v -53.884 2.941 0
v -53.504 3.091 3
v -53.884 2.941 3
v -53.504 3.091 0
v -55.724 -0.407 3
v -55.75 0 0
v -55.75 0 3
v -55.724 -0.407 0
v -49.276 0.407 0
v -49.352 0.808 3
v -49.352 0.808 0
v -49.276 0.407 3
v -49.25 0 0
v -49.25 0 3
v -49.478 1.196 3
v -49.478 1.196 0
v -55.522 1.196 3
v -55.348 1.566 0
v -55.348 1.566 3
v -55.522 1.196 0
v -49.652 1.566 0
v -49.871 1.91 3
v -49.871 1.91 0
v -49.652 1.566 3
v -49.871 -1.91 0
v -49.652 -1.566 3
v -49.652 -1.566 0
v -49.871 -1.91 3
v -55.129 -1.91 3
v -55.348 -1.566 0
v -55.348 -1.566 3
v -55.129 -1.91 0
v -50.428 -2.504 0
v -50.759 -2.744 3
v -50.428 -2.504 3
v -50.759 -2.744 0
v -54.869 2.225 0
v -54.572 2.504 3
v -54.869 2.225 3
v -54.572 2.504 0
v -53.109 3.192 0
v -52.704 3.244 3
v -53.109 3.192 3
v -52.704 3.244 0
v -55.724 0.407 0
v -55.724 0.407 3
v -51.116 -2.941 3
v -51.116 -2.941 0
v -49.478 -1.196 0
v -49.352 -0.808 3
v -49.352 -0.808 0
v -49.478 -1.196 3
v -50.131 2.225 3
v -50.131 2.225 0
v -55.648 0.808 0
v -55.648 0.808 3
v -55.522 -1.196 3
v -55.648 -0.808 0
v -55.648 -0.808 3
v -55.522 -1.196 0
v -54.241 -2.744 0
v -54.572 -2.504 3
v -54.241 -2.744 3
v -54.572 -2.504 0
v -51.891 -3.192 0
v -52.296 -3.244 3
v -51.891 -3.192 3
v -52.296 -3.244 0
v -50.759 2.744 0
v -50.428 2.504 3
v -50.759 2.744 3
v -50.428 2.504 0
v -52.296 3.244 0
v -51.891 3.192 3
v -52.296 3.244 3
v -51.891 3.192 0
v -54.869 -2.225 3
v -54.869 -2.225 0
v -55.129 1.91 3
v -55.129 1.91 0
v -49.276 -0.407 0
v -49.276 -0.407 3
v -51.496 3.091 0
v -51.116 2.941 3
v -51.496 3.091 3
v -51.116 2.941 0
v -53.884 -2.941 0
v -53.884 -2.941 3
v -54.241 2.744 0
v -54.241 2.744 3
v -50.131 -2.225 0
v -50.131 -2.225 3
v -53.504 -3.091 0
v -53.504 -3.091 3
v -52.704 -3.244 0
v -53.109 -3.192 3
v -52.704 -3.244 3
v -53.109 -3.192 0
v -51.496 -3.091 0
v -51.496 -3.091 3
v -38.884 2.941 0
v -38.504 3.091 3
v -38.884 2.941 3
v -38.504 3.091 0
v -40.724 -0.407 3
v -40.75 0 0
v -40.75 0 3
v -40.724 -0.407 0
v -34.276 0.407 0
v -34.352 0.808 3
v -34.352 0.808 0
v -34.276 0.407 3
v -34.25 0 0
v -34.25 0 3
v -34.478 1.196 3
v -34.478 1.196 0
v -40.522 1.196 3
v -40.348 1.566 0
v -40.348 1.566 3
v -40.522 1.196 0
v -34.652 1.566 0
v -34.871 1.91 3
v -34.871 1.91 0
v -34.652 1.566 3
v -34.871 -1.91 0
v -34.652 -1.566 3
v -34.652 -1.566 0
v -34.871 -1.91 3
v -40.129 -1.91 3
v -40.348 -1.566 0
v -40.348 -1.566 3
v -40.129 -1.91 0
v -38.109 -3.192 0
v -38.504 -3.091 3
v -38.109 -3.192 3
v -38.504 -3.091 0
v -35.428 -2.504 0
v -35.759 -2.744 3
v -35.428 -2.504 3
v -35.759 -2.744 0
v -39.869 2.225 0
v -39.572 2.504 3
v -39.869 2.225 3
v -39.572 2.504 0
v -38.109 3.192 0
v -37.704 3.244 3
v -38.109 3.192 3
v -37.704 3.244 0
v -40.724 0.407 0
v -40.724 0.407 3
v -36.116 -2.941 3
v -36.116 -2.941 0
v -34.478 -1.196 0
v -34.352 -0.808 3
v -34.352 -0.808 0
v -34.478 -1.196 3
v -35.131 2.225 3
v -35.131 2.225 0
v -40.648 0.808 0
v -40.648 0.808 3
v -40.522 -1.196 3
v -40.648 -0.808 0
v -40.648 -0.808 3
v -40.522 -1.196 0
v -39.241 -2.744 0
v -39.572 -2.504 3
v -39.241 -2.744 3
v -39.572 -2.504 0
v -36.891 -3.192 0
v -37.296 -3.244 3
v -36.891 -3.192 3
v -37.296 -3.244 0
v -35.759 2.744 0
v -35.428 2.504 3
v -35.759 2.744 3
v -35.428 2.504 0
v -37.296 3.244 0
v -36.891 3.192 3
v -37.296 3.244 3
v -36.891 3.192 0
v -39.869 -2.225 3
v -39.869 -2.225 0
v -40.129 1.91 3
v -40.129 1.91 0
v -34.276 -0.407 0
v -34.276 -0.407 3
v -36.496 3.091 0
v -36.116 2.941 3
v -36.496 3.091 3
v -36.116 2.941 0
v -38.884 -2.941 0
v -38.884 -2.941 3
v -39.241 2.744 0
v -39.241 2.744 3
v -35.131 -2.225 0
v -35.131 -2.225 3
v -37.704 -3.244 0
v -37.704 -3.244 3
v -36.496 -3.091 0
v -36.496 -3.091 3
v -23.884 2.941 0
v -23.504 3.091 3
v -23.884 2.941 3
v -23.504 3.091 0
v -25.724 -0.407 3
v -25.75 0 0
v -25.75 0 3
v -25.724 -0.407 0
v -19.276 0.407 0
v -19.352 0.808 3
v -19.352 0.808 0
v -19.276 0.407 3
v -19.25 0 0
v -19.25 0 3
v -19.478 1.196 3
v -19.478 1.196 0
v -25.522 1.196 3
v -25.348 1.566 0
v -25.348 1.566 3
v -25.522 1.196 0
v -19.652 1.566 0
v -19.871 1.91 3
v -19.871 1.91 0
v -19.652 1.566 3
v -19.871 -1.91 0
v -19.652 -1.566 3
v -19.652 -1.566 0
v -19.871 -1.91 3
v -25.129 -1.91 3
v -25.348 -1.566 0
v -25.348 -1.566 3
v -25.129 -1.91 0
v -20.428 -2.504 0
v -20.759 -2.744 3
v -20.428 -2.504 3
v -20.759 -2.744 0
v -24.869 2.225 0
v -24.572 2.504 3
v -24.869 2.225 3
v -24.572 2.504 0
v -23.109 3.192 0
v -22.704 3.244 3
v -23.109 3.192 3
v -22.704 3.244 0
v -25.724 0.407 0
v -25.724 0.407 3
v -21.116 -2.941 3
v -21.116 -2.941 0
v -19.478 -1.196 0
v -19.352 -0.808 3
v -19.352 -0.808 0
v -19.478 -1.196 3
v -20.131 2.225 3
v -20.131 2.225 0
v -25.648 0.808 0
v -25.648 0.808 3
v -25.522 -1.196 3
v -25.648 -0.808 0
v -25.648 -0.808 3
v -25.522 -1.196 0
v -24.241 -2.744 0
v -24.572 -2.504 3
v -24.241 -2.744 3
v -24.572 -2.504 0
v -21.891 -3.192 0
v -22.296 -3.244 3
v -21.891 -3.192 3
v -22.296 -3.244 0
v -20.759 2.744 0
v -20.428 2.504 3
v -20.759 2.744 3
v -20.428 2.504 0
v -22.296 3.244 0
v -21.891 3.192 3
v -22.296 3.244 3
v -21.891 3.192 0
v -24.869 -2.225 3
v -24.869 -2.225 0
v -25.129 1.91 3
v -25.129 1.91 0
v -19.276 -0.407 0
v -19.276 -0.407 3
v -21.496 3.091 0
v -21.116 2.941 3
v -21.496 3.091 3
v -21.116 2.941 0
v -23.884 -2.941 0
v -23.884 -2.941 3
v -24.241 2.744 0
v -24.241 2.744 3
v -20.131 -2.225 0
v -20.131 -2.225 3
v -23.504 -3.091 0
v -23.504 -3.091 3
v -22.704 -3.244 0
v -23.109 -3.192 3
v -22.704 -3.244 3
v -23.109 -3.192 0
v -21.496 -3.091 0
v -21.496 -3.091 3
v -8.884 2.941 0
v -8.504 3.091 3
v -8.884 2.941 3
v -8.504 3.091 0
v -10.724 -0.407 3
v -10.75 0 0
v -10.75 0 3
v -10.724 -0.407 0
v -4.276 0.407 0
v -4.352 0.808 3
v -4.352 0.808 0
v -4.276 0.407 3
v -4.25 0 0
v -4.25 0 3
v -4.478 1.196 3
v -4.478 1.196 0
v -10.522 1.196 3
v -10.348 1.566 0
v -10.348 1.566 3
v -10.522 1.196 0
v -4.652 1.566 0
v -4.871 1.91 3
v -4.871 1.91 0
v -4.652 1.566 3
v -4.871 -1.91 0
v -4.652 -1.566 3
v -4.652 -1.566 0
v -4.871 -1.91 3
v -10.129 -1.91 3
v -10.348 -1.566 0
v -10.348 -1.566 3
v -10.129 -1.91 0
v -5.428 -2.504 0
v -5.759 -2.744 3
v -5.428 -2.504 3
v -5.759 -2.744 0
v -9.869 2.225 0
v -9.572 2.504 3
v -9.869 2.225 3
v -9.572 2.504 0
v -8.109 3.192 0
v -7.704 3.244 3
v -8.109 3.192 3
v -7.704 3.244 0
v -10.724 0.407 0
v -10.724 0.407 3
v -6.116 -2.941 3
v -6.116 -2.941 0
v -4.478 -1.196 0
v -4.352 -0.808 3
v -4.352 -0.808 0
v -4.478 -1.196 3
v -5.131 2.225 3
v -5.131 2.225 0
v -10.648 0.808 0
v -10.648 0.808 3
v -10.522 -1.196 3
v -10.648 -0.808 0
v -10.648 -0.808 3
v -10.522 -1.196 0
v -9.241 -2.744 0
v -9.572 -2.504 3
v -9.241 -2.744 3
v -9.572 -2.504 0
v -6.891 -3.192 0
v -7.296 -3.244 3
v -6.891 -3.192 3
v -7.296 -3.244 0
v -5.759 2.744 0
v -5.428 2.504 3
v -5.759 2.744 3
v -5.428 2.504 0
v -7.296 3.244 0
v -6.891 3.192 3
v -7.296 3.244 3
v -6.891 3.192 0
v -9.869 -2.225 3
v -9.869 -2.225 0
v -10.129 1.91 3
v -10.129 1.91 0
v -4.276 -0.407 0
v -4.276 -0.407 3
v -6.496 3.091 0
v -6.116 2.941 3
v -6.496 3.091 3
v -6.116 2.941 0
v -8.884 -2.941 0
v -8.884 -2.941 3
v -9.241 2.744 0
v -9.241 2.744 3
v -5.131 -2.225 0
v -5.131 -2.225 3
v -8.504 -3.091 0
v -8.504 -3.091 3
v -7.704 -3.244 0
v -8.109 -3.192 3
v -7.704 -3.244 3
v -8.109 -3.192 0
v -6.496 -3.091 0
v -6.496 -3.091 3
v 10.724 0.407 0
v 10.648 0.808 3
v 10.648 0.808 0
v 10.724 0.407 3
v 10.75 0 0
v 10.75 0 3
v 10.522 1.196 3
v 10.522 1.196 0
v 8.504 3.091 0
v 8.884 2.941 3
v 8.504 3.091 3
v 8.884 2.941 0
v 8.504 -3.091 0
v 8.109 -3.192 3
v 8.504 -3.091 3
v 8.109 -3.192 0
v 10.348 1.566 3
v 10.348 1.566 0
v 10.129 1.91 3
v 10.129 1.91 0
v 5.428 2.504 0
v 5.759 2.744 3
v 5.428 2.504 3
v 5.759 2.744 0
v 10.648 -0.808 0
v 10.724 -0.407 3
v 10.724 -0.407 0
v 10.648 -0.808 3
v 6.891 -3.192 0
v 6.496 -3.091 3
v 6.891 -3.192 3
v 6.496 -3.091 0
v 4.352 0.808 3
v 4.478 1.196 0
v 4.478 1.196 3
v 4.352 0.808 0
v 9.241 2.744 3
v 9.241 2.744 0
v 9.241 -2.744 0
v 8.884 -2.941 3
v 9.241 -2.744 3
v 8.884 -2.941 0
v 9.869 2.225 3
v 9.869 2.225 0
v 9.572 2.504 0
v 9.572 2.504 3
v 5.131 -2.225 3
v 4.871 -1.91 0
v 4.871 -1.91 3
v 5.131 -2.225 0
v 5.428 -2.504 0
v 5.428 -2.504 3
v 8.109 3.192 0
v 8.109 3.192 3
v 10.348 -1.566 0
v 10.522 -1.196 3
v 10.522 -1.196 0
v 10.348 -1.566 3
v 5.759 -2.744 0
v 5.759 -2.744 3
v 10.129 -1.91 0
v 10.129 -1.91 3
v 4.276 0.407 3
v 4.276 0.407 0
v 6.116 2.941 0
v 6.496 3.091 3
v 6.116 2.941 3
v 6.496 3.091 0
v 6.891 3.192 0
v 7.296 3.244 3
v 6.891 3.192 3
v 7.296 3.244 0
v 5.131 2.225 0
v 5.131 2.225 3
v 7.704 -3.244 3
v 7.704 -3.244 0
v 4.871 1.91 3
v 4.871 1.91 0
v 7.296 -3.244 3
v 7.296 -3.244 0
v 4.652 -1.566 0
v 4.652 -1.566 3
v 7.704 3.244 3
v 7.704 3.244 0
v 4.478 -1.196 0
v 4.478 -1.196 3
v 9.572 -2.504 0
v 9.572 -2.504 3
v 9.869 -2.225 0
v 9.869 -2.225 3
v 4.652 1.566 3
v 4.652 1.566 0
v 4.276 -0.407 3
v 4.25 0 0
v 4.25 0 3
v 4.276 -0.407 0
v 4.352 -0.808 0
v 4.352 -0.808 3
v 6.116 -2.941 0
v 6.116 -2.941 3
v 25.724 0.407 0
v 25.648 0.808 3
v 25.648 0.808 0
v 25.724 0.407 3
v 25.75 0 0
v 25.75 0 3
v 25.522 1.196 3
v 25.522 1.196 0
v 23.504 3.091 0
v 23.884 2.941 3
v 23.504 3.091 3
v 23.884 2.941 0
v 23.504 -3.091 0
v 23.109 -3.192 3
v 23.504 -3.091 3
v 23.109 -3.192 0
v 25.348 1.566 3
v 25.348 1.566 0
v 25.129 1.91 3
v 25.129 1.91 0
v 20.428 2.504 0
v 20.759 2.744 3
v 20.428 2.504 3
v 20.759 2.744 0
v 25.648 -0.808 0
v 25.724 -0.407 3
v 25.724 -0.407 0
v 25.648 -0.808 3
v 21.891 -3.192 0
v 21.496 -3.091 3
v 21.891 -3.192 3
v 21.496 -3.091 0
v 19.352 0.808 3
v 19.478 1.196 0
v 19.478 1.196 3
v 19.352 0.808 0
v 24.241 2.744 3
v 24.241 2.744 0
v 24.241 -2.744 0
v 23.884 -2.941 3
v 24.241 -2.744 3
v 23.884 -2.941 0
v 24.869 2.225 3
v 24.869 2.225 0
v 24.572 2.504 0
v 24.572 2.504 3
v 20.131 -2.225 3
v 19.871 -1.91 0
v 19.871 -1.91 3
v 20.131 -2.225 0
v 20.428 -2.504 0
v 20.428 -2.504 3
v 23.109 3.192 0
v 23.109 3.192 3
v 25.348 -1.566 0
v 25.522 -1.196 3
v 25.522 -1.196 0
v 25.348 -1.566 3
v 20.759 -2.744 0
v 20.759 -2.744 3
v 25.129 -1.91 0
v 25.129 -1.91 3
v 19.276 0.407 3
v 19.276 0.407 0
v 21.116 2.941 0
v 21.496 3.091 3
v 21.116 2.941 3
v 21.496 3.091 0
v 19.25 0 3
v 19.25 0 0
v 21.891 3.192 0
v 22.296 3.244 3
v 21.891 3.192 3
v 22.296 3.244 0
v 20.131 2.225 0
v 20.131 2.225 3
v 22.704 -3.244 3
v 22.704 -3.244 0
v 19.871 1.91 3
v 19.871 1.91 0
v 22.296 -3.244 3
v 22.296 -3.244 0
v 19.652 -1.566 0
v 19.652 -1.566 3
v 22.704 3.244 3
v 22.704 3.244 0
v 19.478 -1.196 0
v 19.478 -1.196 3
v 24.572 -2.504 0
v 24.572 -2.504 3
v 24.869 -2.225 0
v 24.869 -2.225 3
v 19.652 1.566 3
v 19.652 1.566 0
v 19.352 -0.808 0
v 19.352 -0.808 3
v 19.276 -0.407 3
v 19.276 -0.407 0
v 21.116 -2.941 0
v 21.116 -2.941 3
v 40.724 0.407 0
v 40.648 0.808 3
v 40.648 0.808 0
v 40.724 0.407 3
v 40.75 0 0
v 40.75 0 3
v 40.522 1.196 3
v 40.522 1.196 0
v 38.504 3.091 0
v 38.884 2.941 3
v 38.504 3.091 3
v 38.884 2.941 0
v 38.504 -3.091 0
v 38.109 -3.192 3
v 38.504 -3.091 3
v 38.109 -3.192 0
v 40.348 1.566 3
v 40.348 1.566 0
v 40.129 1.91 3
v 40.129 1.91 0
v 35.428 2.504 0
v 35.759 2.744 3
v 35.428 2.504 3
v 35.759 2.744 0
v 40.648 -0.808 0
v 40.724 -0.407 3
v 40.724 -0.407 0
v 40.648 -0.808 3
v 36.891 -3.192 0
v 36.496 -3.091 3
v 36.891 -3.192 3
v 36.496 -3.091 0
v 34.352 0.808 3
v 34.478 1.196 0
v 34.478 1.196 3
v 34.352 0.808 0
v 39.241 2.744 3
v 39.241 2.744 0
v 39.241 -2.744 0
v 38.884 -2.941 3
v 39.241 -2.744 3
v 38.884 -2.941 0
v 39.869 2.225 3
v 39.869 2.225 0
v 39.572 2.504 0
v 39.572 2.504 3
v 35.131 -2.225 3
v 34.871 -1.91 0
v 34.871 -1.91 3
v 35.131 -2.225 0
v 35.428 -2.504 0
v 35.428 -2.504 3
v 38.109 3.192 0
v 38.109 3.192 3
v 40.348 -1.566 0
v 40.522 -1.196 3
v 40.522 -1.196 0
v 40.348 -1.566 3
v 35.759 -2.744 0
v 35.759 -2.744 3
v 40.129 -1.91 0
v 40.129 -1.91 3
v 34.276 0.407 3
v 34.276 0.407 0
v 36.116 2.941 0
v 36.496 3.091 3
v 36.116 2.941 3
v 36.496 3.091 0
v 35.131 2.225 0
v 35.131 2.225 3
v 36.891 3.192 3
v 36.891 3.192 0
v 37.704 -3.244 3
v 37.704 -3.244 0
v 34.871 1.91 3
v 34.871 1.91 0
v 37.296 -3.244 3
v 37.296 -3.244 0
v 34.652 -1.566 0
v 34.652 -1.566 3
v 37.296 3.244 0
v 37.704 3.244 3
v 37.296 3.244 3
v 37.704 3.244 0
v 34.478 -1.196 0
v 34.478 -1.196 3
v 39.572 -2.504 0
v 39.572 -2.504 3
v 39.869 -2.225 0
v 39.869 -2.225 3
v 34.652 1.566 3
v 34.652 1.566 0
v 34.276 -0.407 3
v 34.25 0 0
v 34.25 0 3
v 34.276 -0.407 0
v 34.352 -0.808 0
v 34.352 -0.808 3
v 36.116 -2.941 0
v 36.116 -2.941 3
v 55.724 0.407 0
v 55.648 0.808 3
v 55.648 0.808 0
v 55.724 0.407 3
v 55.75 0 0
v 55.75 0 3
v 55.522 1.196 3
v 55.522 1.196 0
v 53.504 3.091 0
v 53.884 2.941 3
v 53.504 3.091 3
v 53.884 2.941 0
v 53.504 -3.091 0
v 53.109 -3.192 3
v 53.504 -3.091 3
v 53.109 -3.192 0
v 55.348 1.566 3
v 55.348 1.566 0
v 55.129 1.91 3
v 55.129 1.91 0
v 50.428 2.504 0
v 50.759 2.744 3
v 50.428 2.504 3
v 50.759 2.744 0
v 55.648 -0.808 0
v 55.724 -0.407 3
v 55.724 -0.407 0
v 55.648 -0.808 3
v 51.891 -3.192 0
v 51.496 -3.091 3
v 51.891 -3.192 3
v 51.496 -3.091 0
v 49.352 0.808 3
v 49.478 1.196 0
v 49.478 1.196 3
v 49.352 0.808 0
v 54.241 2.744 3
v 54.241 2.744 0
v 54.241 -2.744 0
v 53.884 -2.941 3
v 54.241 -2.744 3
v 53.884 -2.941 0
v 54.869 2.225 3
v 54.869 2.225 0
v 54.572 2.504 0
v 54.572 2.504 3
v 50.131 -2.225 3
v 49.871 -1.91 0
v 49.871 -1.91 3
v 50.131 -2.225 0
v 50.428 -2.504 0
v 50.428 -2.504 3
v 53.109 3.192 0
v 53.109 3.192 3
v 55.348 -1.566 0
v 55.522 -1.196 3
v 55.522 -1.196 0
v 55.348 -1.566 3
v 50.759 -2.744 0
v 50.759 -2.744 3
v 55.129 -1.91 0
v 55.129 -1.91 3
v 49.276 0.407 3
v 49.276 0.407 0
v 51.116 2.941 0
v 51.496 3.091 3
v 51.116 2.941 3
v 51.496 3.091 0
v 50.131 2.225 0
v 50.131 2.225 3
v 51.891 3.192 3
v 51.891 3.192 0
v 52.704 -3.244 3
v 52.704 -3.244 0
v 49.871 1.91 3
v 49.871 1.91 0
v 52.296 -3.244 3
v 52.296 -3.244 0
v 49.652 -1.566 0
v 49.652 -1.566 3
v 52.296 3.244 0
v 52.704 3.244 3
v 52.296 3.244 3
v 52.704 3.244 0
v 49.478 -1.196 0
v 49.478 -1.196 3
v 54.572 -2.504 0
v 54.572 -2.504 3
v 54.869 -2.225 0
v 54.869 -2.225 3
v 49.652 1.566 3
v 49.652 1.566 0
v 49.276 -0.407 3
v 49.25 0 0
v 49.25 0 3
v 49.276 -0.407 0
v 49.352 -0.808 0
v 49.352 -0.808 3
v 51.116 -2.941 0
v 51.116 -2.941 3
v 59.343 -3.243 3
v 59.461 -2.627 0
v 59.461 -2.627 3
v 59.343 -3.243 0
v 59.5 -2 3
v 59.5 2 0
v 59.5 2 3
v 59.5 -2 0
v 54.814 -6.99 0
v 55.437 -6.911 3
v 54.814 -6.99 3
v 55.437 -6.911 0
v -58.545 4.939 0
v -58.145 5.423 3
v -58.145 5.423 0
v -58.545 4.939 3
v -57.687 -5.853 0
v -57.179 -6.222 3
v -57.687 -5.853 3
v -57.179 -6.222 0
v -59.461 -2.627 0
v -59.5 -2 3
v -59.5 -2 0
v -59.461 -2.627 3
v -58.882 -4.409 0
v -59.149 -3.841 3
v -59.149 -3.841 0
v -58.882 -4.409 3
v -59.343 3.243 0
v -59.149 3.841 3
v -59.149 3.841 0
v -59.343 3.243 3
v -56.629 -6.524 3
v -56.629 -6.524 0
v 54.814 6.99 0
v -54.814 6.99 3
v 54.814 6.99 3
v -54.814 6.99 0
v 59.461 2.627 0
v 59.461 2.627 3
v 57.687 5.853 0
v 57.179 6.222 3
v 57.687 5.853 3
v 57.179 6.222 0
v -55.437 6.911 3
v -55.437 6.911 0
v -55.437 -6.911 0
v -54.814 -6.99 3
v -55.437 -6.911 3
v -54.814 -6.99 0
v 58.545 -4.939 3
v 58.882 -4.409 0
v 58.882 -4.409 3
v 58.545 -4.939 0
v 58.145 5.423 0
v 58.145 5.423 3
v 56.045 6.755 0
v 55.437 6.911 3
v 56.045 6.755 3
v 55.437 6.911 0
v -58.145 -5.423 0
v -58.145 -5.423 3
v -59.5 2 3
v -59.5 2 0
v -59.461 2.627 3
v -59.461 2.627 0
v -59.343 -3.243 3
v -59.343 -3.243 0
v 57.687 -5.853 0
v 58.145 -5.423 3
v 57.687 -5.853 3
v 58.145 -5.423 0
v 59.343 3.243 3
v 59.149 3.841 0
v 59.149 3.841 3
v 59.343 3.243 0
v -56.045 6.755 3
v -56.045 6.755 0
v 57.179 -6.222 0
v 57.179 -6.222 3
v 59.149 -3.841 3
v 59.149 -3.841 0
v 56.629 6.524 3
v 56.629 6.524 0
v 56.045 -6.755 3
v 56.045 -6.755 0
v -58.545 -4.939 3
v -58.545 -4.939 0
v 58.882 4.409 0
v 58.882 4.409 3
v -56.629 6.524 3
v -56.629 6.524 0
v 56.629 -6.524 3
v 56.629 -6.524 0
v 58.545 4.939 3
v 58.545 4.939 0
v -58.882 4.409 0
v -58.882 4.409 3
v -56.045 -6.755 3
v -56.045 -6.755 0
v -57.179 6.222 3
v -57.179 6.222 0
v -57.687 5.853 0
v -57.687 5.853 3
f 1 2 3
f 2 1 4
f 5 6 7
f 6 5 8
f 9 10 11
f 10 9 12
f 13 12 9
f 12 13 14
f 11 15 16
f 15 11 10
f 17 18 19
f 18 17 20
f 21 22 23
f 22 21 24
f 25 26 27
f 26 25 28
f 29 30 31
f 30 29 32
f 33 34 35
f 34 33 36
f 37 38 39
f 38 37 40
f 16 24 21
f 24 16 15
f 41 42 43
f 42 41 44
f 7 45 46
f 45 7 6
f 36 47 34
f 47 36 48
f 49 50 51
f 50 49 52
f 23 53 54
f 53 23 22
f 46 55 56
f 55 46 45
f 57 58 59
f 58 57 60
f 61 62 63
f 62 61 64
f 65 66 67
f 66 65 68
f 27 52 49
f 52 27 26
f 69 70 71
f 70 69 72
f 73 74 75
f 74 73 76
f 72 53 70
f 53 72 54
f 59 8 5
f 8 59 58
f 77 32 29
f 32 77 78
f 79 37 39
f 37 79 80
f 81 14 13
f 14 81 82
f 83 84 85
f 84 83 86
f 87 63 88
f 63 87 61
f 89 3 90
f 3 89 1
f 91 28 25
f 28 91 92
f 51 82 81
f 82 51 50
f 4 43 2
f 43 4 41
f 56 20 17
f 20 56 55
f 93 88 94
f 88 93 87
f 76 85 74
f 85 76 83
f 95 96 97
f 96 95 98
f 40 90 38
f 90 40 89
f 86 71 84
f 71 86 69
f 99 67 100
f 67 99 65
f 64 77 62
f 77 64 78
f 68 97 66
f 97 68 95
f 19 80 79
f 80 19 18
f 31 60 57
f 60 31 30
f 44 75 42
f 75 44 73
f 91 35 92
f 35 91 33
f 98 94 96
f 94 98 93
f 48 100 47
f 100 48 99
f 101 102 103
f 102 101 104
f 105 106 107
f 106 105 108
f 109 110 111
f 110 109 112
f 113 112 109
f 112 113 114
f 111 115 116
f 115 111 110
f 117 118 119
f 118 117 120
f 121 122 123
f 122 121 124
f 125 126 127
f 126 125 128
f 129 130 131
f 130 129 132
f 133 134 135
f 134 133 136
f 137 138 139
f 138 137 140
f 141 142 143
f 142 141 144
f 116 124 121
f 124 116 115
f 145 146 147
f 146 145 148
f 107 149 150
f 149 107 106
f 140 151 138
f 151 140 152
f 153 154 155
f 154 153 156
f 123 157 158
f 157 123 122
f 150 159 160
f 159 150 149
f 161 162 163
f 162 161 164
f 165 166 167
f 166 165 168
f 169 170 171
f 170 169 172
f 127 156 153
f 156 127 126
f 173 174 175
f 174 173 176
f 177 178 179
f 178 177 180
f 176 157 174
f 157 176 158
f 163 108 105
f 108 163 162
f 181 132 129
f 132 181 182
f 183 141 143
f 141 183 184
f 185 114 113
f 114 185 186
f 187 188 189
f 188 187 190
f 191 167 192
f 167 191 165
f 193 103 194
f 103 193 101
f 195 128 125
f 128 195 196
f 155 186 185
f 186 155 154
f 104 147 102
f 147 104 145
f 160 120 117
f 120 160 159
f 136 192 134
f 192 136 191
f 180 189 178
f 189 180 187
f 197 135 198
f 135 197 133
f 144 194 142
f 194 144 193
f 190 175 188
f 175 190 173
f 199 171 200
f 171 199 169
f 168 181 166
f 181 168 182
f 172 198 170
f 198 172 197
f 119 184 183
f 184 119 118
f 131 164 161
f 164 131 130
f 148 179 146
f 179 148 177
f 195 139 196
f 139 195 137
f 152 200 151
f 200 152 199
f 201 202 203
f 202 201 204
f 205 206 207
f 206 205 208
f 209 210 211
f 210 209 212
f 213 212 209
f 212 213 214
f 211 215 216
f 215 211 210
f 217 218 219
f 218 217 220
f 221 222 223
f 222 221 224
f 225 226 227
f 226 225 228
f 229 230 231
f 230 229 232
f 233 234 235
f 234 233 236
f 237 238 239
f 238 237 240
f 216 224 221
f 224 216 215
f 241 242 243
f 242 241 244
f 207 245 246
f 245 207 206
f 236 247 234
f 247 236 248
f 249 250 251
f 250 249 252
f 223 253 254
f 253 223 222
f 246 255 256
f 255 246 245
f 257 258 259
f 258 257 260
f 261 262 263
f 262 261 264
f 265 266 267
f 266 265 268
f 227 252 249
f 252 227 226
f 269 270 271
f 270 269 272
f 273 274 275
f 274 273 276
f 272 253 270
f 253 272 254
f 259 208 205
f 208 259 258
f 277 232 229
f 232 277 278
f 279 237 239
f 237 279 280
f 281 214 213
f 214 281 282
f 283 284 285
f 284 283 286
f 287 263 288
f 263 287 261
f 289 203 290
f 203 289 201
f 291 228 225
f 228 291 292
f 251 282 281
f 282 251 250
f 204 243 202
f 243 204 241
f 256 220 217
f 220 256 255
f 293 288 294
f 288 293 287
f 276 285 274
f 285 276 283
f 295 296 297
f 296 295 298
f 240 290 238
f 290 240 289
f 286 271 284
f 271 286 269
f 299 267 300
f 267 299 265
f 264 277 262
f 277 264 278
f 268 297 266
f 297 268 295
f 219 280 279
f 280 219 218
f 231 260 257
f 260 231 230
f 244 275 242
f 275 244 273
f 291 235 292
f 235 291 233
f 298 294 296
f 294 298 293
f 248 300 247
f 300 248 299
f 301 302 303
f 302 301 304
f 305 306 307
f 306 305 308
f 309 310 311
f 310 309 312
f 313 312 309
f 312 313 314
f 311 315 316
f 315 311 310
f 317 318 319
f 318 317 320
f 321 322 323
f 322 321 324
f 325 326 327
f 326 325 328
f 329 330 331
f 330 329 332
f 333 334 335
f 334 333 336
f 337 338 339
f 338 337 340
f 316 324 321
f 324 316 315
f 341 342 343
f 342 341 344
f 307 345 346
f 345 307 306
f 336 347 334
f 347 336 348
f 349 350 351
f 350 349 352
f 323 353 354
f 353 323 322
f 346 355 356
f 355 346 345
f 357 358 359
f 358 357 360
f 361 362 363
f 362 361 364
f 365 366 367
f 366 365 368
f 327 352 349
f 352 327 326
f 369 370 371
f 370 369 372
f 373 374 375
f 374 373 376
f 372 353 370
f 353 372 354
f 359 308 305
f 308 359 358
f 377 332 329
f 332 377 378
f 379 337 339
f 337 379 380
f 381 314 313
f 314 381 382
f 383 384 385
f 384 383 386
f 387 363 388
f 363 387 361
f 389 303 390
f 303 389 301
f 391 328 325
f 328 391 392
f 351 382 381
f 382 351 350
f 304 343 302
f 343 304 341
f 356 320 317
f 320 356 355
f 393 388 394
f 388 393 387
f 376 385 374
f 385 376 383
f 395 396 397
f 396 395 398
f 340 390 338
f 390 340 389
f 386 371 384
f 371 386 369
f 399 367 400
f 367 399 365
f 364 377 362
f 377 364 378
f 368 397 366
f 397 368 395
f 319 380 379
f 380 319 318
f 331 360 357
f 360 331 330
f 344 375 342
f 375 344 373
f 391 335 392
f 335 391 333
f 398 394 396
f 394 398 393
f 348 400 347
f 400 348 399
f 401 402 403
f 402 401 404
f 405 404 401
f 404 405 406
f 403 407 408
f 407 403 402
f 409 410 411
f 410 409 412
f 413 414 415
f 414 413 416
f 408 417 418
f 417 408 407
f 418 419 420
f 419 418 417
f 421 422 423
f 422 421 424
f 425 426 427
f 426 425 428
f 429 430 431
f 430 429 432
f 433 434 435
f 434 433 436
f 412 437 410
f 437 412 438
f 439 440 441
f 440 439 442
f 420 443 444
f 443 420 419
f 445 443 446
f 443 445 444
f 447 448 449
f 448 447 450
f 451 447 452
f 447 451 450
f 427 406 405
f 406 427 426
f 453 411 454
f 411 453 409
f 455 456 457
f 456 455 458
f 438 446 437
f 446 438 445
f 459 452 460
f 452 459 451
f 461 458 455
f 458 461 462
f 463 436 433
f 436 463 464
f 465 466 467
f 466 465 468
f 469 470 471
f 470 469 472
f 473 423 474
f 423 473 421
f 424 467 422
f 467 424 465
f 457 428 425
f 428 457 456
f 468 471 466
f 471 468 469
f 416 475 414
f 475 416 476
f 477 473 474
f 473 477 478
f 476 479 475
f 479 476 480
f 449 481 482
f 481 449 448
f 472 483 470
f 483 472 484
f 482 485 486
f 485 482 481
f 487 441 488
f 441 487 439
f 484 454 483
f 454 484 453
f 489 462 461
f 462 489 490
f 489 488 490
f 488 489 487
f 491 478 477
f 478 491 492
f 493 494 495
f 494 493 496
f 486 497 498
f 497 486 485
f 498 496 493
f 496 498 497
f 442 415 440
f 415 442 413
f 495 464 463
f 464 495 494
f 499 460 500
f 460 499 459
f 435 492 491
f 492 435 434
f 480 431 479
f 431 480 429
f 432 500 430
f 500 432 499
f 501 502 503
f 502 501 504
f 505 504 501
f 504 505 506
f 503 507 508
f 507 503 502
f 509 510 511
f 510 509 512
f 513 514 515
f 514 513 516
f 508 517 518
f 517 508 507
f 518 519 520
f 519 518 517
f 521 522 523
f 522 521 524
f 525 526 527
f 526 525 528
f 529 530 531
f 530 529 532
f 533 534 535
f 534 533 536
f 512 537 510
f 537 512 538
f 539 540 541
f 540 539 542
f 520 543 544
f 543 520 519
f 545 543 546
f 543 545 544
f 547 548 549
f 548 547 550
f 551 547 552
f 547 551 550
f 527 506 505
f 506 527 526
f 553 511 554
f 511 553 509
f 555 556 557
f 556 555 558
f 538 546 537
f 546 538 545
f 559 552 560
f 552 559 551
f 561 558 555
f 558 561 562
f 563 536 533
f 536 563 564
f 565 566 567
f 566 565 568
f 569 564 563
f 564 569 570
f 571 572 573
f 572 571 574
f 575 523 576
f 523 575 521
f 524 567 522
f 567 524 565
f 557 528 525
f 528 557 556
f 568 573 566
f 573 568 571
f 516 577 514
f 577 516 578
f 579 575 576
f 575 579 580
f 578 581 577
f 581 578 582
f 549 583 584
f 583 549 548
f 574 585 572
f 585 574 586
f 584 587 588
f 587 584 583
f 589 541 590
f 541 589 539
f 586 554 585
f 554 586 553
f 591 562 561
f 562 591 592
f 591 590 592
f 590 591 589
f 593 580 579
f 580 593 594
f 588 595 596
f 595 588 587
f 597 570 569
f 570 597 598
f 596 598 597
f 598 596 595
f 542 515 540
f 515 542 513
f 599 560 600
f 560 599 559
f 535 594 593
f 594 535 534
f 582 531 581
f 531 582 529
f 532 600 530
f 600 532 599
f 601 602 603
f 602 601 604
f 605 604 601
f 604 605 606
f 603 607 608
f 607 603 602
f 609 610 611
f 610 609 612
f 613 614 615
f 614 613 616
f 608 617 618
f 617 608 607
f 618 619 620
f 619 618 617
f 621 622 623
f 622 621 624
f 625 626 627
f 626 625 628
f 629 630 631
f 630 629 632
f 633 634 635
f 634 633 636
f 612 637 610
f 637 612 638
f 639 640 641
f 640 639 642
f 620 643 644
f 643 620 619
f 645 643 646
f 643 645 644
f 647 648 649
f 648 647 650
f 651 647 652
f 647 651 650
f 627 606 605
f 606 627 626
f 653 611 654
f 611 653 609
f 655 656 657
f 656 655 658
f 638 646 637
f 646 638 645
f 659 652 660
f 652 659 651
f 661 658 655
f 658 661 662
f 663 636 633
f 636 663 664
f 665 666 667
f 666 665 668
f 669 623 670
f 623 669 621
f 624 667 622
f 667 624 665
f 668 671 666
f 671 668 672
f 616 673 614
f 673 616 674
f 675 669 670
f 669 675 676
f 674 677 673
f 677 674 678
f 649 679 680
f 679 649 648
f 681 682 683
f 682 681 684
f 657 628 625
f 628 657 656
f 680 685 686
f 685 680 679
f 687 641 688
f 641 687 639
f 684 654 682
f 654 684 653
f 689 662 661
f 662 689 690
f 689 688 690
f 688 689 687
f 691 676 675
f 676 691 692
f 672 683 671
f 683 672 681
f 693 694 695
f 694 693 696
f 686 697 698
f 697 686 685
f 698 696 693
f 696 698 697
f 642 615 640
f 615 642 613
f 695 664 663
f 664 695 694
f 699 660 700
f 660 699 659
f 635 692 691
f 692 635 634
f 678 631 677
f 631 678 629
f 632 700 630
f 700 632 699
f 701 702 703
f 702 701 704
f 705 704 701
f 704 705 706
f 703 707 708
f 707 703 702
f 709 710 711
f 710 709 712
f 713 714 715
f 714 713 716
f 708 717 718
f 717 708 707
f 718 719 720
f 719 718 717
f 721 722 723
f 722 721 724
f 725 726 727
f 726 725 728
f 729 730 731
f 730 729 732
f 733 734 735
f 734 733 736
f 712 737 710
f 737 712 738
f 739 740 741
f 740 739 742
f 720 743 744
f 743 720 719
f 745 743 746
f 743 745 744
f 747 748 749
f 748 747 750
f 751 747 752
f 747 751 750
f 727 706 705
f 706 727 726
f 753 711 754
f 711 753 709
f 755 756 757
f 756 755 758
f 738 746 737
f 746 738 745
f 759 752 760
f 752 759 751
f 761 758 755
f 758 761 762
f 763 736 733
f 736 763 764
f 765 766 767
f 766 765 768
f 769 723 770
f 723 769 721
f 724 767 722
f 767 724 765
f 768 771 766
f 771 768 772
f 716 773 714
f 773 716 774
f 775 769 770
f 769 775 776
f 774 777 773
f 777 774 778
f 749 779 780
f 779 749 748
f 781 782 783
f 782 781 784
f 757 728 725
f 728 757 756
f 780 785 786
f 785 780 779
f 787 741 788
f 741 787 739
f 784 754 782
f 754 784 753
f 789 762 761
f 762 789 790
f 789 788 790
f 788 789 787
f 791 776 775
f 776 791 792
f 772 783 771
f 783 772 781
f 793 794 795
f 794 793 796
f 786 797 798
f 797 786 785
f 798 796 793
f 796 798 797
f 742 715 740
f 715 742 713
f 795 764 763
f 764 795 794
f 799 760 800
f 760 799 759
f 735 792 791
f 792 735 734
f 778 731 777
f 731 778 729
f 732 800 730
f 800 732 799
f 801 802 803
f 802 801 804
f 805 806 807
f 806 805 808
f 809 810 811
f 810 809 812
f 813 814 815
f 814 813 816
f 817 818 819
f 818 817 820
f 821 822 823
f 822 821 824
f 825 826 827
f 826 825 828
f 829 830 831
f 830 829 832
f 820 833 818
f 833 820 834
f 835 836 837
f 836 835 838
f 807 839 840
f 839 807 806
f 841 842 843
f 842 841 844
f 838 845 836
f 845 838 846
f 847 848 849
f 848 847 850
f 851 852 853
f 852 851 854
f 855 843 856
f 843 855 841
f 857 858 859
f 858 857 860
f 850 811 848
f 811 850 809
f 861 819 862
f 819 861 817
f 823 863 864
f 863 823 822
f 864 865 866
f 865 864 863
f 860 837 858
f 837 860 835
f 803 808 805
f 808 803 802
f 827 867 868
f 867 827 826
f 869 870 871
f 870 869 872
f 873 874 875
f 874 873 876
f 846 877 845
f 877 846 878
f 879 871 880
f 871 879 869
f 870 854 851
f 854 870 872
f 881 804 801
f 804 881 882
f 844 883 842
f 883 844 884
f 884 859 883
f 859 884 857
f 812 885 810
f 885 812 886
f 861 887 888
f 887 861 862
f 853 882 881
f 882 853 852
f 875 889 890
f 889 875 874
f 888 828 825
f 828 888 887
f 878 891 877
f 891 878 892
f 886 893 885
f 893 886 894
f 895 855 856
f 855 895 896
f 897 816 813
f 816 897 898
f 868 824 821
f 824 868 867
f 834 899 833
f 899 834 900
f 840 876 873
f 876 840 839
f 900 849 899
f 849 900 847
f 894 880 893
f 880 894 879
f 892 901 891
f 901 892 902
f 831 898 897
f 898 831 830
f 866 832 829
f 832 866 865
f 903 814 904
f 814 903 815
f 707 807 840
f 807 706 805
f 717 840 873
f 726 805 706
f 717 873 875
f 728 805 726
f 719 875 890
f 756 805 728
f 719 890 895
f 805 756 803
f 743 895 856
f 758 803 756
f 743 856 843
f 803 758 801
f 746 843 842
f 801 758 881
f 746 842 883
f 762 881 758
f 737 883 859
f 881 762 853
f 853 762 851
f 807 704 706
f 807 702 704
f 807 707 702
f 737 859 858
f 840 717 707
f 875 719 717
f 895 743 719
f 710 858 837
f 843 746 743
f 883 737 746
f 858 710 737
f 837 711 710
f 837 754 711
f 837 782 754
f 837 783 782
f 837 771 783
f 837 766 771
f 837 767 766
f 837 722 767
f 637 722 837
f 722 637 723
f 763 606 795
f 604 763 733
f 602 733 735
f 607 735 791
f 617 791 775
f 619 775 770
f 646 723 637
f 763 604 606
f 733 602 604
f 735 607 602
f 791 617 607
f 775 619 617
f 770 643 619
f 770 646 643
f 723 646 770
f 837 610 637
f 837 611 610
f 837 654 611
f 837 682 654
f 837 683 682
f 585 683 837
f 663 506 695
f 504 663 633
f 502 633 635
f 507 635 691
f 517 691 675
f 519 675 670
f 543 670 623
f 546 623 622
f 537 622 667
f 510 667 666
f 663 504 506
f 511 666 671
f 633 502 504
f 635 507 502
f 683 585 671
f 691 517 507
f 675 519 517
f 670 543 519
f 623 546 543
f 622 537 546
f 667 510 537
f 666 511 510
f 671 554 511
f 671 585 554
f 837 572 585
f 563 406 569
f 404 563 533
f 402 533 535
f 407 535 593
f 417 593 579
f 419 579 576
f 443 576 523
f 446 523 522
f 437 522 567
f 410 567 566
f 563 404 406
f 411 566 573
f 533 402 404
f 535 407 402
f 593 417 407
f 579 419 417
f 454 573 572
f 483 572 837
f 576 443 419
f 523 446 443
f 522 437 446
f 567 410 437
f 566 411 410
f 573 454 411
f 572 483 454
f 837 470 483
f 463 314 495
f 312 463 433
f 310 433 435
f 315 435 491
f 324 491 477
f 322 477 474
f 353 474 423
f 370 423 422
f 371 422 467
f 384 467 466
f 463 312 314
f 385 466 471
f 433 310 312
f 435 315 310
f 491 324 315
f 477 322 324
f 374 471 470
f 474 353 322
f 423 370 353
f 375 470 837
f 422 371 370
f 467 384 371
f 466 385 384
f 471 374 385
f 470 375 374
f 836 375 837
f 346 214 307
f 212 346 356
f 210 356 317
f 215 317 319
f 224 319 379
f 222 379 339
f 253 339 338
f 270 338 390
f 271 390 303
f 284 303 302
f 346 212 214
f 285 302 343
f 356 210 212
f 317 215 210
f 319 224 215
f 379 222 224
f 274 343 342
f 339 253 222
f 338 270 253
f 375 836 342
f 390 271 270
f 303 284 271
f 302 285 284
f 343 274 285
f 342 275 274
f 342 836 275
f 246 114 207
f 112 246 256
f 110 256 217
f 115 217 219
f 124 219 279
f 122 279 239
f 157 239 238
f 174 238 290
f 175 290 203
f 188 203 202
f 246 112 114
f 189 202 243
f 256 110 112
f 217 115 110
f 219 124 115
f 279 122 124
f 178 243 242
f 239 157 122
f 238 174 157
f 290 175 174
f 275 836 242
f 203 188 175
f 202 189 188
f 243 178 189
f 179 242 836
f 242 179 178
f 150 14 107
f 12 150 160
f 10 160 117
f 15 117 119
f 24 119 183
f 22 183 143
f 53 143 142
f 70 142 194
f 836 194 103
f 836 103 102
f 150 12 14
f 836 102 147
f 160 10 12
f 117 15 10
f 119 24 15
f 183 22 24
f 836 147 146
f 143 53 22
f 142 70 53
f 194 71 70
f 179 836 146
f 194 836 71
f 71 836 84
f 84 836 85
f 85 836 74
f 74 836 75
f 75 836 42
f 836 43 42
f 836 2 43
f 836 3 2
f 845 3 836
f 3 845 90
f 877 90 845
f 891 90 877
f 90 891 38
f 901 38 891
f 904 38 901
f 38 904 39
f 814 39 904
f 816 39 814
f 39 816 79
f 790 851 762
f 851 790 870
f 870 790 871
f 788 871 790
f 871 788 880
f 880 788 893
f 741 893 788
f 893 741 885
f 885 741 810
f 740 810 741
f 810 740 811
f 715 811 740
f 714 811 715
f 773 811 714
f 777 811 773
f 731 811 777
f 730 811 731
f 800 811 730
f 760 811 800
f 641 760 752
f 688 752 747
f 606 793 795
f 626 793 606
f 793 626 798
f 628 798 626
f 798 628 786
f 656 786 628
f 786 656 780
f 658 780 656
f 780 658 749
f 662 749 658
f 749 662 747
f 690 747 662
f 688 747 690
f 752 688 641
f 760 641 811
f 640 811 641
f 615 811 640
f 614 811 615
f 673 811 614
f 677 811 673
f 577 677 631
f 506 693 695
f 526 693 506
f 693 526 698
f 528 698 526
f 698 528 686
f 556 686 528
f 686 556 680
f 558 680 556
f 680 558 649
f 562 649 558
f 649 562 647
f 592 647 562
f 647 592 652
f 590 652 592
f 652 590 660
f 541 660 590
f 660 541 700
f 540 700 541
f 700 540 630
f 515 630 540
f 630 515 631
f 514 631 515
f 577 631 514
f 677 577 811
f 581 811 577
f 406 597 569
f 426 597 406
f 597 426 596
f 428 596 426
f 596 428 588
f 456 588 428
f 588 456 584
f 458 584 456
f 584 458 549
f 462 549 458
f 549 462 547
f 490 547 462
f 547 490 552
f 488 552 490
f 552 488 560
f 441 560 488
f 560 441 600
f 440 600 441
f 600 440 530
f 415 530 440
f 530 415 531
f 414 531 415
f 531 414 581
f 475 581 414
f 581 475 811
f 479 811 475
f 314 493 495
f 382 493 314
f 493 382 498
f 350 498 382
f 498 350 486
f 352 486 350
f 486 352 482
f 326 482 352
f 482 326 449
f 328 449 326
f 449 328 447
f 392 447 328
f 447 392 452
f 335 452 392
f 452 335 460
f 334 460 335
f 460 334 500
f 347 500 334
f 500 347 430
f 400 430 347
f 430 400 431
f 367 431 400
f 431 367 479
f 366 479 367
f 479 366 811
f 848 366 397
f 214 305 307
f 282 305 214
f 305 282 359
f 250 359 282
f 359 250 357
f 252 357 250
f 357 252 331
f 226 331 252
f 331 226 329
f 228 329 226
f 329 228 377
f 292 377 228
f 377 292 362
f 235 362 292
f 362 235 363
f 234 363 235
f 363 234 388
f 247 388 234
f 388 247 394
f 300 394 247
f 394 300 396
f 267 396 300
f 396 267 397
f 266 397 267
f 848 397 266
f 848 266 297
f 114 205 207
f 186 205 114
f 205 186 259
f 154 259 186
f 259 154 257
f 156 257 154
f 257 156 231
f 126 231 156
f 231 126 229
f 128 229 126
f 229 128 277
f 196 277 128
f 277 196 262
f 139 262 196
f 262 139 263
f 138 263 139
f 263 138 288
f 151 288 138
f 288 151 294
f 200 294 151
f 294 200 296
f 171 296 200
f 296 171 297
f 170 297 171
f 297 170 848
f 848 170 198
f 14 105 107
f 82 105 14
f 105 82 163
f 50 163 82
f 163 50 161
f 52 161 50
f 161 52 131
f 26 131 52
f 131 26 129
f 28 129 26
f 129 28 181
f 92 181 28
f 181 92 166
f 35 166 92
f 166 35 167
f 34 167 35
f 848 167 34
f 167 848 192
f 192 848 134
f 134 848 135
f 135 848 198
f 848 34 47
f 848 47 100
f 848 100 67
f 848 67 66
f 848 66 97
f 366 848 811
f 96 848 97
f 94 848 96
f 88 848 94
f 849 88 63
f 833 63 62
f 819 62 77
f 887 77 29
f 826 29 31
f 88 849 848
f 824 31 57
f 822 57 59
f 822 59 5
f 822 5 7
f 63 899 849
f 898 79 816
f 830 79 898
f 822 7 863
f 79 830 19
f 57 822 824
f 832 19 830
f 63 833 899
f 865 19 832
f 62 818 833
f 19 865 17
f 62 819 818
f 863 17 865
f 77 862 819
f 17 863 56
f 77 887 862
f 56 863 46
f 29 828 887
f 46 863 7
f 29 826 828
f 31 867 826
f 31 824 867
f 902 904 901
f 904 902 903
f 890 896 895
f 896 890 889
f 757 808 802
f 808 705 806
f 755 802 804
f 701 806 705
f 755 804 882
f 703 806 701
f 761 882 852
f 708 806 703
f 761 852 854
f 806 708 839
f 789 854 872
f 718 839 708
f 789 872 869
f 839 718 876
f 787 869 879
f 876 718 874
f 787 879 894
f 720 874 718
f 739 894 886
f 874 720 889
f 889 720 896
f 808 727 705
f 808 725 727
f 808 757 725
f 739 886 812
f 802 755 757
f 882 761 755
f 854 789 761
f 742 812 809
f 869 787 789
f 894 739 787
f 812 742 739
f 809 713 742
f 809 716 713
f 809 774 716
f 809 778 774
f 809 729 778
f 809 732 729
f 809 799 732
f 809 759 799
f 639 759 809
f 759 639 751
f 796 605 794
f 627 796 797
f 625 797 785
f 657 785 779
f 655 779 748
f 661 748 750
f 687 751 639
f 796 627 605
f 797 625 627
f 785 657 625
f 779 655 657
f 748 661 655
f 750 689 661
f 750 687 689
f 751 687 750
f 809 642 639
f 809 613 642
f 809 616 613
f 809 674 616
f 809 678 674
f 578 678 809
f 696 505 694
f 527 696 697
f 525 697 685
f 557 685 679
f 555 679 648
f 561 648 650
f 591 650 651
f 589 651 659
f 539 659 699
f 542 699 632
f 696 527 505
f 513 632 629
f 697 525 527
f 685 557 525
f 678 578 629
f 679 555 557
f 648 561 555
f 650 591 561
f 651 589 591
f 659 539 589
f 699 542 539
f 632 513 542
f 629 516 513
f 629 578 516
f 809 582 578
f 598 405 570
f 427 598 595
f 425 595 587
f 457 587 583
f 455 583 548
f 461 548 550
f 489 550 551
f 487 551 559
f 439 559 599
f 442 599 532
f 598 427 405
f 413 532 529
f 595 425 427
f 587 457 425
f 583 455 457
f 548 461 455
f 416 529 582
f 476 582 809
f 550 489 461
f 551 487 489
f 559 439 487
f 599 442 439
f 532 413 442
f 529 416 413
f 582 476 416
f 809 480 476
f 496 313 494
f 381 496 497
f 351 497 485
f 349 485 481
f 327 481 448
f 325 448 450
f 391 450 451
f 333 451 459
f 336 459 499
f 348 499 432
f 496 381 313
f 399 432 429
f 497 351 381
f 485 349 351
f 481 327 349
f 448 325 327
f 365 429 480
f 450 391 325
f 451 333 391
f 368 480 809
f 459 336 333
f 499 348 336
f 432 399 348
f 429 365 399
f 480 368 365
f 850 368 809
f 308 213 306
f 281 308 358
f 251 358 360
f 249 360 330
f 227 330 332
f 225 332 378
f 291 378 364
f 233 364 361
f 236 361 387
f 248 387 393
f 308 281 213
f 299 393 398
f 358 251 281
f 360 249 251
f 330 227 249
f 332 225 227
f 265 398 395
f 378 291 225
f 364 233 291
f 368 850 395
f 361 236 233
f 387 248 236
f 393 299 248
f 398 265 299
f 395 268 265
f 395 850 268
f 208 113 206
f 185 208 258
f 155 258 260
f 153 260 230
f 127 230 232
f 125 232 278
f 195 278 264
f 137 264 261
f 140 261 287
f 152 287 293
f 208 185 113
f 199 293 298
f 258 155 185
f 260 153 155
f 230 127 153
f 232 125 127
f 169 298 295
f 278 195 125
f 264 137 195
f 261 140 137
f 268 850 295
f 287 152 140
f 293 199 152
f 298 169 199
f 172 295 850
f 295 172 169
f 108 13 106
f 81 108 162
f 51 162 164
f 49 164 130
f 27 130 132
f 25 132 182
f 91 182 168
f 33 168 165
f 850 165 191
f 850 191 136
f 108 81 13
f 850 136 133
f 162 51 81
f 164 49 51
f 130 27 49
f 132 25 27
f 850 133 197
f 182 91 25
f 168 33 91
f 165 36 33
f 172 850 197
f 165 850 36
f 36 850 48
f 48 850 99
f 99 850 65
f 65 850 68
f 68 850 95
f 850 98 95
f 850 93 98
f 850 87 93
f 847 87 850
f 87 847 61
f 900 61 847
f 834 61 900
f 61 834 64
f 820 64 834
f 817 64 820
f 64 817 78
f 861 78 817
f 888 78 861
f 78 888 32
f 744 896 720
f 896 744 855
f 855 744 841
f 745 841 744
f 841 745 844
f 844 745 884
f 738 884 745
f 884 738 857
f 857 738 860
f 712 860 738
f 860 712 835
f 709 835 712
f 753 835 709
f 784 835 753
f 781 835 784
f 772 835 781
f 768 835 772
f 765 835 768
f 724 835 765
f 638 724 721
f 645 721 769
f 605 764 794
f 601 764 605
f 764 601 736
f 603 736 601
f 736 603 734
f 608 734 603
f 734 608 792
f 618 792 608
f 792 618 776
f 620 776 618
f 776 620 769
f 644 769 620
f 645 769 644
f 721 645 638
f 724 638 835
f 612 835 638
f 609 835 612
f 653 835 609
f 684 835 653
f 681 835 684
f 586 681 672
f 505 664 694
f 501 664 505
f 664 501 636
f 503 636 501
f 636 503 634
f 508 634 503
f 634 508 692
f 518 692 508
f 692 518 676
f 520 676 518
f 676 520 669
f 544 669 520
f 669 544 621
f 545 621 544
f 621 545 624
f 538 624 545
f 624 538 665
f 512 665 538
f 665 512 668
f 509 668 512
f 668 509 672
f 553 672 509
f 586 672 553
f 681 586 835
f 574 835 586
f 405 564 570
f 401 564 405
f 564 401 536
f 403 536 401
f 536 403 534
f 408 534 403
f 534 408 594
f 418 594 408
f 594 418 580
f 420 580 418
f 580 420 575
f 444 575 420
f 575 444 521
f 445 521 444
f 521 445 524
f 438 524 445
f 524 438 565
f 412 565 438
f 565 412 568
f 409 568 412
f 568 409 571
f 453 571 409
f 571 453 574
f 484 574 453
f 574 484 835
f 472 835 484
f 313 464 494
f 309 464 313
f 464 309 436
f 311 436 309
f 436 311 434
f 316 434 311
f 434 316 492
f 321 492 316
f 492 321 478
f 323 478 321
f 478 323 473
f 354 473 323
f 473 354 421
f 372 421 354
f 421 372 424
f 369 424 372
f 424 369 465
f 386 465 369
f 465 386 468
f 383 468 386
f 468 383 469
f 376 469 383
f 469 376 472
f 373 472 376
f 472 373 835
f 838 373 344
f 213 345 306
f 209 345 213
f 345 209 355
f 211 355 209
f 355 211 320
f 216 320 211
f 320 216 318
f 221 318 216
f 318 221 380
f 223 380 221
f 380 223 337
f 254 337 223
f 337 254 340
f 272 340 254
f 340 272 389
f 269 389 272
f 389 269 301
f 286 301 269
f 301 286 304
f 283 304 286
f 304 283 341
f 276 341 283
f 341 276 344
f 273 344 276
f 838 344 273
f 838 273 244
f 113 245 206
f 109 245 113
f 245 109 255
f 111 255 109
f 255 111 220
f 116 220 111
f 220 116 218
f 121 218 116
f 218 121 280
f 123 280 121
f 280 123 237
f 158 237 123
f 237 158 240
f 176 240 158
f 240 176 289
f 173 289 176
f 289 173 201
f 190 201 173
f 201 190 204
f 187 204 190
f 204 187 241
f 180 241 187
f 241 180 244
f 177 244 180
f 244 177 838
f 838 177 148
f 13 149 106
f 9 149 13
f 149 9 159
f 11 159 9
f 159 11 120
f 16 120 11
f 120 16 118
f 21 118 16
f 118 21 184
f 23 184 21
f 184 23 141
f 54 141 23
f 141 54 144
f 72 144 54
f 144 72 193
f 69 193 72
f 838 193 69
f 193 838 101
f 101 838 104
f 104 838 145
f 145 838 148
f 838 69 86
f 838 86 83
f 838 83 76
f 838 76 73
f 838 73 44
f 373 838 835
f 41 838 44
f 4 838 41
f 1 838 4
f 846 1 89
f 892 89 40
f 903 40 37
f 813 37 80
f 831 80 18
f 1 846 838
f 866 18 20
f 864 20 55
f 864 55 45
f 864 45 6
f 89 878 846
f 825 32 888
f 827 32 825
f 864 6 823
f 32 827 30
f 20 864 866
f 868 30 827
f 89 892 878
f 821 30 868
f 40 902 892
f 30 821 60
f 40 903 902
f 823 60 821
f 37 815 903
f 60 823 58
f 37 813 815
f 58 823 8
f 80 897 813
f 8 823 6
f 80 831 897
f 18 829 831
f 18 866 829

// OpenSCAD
$fn = 50;


difference() {
	union() {
		hull() {
			translate(v = [-54.5000000000, 2.0000000000, 0]) {
				cylinder(h = 3, r = 5);
			}
			translate(v = [54.5000000000, 2.0000000000, 0]) {
				cylinder(h = 3, r = 5);
			}
			translate(v = [-54.5000000000, -2.0000000000, 0]) {
				cylinder(h = 3, r = 5);
			}
			translate(v = [54.5000000000, -2.0000000000, 0]) {
				cylinder(h = 3, r = 5);
			}
		}
	}
	union() {
		translate(v = [-52.5000000000, 0.0000000000, -100.0000000000]) {
			cylinder(h = 200, r = 3.2500000000);
		}
		translate(v = [-37.5000000000, 0.0000000000, -100.0000000000]) {
			cylinder(h = 200, r = 3.2500000000);
		}
		translate(v = [-22.5000000000, 0.0000000000, -100.0000000000]) {
			cylinder(h = 200, r = 3.2500000000);
		}
		translate(v = [-7.5000000000, 0.0000000000, -100.0000000000]) {
			cylinder(h = 200, r = 3.2500000000);
		}
		translate(v = [7.5000000000, 0.0000000000, -100.0000000000]) {
			cylinder(h = 200, r = 3.2500000000);
		}
		translate(v = [22.5000000000, 0.0000000000, -100.0000000000]) {
			cylinder(h = 200, r = 3.2500000000);
		}
		translate(v = [37.5000000000, 0.0000000000, -100.0000000000]) {
			cylinder(h = 200, r = 3.2500000000);
		}
		translate(v = [52.5000000000, 0.0000000000, -100.0000000000]) {
			cylinder(h = 200, r = 3.2500000000);
		}
	}
}
